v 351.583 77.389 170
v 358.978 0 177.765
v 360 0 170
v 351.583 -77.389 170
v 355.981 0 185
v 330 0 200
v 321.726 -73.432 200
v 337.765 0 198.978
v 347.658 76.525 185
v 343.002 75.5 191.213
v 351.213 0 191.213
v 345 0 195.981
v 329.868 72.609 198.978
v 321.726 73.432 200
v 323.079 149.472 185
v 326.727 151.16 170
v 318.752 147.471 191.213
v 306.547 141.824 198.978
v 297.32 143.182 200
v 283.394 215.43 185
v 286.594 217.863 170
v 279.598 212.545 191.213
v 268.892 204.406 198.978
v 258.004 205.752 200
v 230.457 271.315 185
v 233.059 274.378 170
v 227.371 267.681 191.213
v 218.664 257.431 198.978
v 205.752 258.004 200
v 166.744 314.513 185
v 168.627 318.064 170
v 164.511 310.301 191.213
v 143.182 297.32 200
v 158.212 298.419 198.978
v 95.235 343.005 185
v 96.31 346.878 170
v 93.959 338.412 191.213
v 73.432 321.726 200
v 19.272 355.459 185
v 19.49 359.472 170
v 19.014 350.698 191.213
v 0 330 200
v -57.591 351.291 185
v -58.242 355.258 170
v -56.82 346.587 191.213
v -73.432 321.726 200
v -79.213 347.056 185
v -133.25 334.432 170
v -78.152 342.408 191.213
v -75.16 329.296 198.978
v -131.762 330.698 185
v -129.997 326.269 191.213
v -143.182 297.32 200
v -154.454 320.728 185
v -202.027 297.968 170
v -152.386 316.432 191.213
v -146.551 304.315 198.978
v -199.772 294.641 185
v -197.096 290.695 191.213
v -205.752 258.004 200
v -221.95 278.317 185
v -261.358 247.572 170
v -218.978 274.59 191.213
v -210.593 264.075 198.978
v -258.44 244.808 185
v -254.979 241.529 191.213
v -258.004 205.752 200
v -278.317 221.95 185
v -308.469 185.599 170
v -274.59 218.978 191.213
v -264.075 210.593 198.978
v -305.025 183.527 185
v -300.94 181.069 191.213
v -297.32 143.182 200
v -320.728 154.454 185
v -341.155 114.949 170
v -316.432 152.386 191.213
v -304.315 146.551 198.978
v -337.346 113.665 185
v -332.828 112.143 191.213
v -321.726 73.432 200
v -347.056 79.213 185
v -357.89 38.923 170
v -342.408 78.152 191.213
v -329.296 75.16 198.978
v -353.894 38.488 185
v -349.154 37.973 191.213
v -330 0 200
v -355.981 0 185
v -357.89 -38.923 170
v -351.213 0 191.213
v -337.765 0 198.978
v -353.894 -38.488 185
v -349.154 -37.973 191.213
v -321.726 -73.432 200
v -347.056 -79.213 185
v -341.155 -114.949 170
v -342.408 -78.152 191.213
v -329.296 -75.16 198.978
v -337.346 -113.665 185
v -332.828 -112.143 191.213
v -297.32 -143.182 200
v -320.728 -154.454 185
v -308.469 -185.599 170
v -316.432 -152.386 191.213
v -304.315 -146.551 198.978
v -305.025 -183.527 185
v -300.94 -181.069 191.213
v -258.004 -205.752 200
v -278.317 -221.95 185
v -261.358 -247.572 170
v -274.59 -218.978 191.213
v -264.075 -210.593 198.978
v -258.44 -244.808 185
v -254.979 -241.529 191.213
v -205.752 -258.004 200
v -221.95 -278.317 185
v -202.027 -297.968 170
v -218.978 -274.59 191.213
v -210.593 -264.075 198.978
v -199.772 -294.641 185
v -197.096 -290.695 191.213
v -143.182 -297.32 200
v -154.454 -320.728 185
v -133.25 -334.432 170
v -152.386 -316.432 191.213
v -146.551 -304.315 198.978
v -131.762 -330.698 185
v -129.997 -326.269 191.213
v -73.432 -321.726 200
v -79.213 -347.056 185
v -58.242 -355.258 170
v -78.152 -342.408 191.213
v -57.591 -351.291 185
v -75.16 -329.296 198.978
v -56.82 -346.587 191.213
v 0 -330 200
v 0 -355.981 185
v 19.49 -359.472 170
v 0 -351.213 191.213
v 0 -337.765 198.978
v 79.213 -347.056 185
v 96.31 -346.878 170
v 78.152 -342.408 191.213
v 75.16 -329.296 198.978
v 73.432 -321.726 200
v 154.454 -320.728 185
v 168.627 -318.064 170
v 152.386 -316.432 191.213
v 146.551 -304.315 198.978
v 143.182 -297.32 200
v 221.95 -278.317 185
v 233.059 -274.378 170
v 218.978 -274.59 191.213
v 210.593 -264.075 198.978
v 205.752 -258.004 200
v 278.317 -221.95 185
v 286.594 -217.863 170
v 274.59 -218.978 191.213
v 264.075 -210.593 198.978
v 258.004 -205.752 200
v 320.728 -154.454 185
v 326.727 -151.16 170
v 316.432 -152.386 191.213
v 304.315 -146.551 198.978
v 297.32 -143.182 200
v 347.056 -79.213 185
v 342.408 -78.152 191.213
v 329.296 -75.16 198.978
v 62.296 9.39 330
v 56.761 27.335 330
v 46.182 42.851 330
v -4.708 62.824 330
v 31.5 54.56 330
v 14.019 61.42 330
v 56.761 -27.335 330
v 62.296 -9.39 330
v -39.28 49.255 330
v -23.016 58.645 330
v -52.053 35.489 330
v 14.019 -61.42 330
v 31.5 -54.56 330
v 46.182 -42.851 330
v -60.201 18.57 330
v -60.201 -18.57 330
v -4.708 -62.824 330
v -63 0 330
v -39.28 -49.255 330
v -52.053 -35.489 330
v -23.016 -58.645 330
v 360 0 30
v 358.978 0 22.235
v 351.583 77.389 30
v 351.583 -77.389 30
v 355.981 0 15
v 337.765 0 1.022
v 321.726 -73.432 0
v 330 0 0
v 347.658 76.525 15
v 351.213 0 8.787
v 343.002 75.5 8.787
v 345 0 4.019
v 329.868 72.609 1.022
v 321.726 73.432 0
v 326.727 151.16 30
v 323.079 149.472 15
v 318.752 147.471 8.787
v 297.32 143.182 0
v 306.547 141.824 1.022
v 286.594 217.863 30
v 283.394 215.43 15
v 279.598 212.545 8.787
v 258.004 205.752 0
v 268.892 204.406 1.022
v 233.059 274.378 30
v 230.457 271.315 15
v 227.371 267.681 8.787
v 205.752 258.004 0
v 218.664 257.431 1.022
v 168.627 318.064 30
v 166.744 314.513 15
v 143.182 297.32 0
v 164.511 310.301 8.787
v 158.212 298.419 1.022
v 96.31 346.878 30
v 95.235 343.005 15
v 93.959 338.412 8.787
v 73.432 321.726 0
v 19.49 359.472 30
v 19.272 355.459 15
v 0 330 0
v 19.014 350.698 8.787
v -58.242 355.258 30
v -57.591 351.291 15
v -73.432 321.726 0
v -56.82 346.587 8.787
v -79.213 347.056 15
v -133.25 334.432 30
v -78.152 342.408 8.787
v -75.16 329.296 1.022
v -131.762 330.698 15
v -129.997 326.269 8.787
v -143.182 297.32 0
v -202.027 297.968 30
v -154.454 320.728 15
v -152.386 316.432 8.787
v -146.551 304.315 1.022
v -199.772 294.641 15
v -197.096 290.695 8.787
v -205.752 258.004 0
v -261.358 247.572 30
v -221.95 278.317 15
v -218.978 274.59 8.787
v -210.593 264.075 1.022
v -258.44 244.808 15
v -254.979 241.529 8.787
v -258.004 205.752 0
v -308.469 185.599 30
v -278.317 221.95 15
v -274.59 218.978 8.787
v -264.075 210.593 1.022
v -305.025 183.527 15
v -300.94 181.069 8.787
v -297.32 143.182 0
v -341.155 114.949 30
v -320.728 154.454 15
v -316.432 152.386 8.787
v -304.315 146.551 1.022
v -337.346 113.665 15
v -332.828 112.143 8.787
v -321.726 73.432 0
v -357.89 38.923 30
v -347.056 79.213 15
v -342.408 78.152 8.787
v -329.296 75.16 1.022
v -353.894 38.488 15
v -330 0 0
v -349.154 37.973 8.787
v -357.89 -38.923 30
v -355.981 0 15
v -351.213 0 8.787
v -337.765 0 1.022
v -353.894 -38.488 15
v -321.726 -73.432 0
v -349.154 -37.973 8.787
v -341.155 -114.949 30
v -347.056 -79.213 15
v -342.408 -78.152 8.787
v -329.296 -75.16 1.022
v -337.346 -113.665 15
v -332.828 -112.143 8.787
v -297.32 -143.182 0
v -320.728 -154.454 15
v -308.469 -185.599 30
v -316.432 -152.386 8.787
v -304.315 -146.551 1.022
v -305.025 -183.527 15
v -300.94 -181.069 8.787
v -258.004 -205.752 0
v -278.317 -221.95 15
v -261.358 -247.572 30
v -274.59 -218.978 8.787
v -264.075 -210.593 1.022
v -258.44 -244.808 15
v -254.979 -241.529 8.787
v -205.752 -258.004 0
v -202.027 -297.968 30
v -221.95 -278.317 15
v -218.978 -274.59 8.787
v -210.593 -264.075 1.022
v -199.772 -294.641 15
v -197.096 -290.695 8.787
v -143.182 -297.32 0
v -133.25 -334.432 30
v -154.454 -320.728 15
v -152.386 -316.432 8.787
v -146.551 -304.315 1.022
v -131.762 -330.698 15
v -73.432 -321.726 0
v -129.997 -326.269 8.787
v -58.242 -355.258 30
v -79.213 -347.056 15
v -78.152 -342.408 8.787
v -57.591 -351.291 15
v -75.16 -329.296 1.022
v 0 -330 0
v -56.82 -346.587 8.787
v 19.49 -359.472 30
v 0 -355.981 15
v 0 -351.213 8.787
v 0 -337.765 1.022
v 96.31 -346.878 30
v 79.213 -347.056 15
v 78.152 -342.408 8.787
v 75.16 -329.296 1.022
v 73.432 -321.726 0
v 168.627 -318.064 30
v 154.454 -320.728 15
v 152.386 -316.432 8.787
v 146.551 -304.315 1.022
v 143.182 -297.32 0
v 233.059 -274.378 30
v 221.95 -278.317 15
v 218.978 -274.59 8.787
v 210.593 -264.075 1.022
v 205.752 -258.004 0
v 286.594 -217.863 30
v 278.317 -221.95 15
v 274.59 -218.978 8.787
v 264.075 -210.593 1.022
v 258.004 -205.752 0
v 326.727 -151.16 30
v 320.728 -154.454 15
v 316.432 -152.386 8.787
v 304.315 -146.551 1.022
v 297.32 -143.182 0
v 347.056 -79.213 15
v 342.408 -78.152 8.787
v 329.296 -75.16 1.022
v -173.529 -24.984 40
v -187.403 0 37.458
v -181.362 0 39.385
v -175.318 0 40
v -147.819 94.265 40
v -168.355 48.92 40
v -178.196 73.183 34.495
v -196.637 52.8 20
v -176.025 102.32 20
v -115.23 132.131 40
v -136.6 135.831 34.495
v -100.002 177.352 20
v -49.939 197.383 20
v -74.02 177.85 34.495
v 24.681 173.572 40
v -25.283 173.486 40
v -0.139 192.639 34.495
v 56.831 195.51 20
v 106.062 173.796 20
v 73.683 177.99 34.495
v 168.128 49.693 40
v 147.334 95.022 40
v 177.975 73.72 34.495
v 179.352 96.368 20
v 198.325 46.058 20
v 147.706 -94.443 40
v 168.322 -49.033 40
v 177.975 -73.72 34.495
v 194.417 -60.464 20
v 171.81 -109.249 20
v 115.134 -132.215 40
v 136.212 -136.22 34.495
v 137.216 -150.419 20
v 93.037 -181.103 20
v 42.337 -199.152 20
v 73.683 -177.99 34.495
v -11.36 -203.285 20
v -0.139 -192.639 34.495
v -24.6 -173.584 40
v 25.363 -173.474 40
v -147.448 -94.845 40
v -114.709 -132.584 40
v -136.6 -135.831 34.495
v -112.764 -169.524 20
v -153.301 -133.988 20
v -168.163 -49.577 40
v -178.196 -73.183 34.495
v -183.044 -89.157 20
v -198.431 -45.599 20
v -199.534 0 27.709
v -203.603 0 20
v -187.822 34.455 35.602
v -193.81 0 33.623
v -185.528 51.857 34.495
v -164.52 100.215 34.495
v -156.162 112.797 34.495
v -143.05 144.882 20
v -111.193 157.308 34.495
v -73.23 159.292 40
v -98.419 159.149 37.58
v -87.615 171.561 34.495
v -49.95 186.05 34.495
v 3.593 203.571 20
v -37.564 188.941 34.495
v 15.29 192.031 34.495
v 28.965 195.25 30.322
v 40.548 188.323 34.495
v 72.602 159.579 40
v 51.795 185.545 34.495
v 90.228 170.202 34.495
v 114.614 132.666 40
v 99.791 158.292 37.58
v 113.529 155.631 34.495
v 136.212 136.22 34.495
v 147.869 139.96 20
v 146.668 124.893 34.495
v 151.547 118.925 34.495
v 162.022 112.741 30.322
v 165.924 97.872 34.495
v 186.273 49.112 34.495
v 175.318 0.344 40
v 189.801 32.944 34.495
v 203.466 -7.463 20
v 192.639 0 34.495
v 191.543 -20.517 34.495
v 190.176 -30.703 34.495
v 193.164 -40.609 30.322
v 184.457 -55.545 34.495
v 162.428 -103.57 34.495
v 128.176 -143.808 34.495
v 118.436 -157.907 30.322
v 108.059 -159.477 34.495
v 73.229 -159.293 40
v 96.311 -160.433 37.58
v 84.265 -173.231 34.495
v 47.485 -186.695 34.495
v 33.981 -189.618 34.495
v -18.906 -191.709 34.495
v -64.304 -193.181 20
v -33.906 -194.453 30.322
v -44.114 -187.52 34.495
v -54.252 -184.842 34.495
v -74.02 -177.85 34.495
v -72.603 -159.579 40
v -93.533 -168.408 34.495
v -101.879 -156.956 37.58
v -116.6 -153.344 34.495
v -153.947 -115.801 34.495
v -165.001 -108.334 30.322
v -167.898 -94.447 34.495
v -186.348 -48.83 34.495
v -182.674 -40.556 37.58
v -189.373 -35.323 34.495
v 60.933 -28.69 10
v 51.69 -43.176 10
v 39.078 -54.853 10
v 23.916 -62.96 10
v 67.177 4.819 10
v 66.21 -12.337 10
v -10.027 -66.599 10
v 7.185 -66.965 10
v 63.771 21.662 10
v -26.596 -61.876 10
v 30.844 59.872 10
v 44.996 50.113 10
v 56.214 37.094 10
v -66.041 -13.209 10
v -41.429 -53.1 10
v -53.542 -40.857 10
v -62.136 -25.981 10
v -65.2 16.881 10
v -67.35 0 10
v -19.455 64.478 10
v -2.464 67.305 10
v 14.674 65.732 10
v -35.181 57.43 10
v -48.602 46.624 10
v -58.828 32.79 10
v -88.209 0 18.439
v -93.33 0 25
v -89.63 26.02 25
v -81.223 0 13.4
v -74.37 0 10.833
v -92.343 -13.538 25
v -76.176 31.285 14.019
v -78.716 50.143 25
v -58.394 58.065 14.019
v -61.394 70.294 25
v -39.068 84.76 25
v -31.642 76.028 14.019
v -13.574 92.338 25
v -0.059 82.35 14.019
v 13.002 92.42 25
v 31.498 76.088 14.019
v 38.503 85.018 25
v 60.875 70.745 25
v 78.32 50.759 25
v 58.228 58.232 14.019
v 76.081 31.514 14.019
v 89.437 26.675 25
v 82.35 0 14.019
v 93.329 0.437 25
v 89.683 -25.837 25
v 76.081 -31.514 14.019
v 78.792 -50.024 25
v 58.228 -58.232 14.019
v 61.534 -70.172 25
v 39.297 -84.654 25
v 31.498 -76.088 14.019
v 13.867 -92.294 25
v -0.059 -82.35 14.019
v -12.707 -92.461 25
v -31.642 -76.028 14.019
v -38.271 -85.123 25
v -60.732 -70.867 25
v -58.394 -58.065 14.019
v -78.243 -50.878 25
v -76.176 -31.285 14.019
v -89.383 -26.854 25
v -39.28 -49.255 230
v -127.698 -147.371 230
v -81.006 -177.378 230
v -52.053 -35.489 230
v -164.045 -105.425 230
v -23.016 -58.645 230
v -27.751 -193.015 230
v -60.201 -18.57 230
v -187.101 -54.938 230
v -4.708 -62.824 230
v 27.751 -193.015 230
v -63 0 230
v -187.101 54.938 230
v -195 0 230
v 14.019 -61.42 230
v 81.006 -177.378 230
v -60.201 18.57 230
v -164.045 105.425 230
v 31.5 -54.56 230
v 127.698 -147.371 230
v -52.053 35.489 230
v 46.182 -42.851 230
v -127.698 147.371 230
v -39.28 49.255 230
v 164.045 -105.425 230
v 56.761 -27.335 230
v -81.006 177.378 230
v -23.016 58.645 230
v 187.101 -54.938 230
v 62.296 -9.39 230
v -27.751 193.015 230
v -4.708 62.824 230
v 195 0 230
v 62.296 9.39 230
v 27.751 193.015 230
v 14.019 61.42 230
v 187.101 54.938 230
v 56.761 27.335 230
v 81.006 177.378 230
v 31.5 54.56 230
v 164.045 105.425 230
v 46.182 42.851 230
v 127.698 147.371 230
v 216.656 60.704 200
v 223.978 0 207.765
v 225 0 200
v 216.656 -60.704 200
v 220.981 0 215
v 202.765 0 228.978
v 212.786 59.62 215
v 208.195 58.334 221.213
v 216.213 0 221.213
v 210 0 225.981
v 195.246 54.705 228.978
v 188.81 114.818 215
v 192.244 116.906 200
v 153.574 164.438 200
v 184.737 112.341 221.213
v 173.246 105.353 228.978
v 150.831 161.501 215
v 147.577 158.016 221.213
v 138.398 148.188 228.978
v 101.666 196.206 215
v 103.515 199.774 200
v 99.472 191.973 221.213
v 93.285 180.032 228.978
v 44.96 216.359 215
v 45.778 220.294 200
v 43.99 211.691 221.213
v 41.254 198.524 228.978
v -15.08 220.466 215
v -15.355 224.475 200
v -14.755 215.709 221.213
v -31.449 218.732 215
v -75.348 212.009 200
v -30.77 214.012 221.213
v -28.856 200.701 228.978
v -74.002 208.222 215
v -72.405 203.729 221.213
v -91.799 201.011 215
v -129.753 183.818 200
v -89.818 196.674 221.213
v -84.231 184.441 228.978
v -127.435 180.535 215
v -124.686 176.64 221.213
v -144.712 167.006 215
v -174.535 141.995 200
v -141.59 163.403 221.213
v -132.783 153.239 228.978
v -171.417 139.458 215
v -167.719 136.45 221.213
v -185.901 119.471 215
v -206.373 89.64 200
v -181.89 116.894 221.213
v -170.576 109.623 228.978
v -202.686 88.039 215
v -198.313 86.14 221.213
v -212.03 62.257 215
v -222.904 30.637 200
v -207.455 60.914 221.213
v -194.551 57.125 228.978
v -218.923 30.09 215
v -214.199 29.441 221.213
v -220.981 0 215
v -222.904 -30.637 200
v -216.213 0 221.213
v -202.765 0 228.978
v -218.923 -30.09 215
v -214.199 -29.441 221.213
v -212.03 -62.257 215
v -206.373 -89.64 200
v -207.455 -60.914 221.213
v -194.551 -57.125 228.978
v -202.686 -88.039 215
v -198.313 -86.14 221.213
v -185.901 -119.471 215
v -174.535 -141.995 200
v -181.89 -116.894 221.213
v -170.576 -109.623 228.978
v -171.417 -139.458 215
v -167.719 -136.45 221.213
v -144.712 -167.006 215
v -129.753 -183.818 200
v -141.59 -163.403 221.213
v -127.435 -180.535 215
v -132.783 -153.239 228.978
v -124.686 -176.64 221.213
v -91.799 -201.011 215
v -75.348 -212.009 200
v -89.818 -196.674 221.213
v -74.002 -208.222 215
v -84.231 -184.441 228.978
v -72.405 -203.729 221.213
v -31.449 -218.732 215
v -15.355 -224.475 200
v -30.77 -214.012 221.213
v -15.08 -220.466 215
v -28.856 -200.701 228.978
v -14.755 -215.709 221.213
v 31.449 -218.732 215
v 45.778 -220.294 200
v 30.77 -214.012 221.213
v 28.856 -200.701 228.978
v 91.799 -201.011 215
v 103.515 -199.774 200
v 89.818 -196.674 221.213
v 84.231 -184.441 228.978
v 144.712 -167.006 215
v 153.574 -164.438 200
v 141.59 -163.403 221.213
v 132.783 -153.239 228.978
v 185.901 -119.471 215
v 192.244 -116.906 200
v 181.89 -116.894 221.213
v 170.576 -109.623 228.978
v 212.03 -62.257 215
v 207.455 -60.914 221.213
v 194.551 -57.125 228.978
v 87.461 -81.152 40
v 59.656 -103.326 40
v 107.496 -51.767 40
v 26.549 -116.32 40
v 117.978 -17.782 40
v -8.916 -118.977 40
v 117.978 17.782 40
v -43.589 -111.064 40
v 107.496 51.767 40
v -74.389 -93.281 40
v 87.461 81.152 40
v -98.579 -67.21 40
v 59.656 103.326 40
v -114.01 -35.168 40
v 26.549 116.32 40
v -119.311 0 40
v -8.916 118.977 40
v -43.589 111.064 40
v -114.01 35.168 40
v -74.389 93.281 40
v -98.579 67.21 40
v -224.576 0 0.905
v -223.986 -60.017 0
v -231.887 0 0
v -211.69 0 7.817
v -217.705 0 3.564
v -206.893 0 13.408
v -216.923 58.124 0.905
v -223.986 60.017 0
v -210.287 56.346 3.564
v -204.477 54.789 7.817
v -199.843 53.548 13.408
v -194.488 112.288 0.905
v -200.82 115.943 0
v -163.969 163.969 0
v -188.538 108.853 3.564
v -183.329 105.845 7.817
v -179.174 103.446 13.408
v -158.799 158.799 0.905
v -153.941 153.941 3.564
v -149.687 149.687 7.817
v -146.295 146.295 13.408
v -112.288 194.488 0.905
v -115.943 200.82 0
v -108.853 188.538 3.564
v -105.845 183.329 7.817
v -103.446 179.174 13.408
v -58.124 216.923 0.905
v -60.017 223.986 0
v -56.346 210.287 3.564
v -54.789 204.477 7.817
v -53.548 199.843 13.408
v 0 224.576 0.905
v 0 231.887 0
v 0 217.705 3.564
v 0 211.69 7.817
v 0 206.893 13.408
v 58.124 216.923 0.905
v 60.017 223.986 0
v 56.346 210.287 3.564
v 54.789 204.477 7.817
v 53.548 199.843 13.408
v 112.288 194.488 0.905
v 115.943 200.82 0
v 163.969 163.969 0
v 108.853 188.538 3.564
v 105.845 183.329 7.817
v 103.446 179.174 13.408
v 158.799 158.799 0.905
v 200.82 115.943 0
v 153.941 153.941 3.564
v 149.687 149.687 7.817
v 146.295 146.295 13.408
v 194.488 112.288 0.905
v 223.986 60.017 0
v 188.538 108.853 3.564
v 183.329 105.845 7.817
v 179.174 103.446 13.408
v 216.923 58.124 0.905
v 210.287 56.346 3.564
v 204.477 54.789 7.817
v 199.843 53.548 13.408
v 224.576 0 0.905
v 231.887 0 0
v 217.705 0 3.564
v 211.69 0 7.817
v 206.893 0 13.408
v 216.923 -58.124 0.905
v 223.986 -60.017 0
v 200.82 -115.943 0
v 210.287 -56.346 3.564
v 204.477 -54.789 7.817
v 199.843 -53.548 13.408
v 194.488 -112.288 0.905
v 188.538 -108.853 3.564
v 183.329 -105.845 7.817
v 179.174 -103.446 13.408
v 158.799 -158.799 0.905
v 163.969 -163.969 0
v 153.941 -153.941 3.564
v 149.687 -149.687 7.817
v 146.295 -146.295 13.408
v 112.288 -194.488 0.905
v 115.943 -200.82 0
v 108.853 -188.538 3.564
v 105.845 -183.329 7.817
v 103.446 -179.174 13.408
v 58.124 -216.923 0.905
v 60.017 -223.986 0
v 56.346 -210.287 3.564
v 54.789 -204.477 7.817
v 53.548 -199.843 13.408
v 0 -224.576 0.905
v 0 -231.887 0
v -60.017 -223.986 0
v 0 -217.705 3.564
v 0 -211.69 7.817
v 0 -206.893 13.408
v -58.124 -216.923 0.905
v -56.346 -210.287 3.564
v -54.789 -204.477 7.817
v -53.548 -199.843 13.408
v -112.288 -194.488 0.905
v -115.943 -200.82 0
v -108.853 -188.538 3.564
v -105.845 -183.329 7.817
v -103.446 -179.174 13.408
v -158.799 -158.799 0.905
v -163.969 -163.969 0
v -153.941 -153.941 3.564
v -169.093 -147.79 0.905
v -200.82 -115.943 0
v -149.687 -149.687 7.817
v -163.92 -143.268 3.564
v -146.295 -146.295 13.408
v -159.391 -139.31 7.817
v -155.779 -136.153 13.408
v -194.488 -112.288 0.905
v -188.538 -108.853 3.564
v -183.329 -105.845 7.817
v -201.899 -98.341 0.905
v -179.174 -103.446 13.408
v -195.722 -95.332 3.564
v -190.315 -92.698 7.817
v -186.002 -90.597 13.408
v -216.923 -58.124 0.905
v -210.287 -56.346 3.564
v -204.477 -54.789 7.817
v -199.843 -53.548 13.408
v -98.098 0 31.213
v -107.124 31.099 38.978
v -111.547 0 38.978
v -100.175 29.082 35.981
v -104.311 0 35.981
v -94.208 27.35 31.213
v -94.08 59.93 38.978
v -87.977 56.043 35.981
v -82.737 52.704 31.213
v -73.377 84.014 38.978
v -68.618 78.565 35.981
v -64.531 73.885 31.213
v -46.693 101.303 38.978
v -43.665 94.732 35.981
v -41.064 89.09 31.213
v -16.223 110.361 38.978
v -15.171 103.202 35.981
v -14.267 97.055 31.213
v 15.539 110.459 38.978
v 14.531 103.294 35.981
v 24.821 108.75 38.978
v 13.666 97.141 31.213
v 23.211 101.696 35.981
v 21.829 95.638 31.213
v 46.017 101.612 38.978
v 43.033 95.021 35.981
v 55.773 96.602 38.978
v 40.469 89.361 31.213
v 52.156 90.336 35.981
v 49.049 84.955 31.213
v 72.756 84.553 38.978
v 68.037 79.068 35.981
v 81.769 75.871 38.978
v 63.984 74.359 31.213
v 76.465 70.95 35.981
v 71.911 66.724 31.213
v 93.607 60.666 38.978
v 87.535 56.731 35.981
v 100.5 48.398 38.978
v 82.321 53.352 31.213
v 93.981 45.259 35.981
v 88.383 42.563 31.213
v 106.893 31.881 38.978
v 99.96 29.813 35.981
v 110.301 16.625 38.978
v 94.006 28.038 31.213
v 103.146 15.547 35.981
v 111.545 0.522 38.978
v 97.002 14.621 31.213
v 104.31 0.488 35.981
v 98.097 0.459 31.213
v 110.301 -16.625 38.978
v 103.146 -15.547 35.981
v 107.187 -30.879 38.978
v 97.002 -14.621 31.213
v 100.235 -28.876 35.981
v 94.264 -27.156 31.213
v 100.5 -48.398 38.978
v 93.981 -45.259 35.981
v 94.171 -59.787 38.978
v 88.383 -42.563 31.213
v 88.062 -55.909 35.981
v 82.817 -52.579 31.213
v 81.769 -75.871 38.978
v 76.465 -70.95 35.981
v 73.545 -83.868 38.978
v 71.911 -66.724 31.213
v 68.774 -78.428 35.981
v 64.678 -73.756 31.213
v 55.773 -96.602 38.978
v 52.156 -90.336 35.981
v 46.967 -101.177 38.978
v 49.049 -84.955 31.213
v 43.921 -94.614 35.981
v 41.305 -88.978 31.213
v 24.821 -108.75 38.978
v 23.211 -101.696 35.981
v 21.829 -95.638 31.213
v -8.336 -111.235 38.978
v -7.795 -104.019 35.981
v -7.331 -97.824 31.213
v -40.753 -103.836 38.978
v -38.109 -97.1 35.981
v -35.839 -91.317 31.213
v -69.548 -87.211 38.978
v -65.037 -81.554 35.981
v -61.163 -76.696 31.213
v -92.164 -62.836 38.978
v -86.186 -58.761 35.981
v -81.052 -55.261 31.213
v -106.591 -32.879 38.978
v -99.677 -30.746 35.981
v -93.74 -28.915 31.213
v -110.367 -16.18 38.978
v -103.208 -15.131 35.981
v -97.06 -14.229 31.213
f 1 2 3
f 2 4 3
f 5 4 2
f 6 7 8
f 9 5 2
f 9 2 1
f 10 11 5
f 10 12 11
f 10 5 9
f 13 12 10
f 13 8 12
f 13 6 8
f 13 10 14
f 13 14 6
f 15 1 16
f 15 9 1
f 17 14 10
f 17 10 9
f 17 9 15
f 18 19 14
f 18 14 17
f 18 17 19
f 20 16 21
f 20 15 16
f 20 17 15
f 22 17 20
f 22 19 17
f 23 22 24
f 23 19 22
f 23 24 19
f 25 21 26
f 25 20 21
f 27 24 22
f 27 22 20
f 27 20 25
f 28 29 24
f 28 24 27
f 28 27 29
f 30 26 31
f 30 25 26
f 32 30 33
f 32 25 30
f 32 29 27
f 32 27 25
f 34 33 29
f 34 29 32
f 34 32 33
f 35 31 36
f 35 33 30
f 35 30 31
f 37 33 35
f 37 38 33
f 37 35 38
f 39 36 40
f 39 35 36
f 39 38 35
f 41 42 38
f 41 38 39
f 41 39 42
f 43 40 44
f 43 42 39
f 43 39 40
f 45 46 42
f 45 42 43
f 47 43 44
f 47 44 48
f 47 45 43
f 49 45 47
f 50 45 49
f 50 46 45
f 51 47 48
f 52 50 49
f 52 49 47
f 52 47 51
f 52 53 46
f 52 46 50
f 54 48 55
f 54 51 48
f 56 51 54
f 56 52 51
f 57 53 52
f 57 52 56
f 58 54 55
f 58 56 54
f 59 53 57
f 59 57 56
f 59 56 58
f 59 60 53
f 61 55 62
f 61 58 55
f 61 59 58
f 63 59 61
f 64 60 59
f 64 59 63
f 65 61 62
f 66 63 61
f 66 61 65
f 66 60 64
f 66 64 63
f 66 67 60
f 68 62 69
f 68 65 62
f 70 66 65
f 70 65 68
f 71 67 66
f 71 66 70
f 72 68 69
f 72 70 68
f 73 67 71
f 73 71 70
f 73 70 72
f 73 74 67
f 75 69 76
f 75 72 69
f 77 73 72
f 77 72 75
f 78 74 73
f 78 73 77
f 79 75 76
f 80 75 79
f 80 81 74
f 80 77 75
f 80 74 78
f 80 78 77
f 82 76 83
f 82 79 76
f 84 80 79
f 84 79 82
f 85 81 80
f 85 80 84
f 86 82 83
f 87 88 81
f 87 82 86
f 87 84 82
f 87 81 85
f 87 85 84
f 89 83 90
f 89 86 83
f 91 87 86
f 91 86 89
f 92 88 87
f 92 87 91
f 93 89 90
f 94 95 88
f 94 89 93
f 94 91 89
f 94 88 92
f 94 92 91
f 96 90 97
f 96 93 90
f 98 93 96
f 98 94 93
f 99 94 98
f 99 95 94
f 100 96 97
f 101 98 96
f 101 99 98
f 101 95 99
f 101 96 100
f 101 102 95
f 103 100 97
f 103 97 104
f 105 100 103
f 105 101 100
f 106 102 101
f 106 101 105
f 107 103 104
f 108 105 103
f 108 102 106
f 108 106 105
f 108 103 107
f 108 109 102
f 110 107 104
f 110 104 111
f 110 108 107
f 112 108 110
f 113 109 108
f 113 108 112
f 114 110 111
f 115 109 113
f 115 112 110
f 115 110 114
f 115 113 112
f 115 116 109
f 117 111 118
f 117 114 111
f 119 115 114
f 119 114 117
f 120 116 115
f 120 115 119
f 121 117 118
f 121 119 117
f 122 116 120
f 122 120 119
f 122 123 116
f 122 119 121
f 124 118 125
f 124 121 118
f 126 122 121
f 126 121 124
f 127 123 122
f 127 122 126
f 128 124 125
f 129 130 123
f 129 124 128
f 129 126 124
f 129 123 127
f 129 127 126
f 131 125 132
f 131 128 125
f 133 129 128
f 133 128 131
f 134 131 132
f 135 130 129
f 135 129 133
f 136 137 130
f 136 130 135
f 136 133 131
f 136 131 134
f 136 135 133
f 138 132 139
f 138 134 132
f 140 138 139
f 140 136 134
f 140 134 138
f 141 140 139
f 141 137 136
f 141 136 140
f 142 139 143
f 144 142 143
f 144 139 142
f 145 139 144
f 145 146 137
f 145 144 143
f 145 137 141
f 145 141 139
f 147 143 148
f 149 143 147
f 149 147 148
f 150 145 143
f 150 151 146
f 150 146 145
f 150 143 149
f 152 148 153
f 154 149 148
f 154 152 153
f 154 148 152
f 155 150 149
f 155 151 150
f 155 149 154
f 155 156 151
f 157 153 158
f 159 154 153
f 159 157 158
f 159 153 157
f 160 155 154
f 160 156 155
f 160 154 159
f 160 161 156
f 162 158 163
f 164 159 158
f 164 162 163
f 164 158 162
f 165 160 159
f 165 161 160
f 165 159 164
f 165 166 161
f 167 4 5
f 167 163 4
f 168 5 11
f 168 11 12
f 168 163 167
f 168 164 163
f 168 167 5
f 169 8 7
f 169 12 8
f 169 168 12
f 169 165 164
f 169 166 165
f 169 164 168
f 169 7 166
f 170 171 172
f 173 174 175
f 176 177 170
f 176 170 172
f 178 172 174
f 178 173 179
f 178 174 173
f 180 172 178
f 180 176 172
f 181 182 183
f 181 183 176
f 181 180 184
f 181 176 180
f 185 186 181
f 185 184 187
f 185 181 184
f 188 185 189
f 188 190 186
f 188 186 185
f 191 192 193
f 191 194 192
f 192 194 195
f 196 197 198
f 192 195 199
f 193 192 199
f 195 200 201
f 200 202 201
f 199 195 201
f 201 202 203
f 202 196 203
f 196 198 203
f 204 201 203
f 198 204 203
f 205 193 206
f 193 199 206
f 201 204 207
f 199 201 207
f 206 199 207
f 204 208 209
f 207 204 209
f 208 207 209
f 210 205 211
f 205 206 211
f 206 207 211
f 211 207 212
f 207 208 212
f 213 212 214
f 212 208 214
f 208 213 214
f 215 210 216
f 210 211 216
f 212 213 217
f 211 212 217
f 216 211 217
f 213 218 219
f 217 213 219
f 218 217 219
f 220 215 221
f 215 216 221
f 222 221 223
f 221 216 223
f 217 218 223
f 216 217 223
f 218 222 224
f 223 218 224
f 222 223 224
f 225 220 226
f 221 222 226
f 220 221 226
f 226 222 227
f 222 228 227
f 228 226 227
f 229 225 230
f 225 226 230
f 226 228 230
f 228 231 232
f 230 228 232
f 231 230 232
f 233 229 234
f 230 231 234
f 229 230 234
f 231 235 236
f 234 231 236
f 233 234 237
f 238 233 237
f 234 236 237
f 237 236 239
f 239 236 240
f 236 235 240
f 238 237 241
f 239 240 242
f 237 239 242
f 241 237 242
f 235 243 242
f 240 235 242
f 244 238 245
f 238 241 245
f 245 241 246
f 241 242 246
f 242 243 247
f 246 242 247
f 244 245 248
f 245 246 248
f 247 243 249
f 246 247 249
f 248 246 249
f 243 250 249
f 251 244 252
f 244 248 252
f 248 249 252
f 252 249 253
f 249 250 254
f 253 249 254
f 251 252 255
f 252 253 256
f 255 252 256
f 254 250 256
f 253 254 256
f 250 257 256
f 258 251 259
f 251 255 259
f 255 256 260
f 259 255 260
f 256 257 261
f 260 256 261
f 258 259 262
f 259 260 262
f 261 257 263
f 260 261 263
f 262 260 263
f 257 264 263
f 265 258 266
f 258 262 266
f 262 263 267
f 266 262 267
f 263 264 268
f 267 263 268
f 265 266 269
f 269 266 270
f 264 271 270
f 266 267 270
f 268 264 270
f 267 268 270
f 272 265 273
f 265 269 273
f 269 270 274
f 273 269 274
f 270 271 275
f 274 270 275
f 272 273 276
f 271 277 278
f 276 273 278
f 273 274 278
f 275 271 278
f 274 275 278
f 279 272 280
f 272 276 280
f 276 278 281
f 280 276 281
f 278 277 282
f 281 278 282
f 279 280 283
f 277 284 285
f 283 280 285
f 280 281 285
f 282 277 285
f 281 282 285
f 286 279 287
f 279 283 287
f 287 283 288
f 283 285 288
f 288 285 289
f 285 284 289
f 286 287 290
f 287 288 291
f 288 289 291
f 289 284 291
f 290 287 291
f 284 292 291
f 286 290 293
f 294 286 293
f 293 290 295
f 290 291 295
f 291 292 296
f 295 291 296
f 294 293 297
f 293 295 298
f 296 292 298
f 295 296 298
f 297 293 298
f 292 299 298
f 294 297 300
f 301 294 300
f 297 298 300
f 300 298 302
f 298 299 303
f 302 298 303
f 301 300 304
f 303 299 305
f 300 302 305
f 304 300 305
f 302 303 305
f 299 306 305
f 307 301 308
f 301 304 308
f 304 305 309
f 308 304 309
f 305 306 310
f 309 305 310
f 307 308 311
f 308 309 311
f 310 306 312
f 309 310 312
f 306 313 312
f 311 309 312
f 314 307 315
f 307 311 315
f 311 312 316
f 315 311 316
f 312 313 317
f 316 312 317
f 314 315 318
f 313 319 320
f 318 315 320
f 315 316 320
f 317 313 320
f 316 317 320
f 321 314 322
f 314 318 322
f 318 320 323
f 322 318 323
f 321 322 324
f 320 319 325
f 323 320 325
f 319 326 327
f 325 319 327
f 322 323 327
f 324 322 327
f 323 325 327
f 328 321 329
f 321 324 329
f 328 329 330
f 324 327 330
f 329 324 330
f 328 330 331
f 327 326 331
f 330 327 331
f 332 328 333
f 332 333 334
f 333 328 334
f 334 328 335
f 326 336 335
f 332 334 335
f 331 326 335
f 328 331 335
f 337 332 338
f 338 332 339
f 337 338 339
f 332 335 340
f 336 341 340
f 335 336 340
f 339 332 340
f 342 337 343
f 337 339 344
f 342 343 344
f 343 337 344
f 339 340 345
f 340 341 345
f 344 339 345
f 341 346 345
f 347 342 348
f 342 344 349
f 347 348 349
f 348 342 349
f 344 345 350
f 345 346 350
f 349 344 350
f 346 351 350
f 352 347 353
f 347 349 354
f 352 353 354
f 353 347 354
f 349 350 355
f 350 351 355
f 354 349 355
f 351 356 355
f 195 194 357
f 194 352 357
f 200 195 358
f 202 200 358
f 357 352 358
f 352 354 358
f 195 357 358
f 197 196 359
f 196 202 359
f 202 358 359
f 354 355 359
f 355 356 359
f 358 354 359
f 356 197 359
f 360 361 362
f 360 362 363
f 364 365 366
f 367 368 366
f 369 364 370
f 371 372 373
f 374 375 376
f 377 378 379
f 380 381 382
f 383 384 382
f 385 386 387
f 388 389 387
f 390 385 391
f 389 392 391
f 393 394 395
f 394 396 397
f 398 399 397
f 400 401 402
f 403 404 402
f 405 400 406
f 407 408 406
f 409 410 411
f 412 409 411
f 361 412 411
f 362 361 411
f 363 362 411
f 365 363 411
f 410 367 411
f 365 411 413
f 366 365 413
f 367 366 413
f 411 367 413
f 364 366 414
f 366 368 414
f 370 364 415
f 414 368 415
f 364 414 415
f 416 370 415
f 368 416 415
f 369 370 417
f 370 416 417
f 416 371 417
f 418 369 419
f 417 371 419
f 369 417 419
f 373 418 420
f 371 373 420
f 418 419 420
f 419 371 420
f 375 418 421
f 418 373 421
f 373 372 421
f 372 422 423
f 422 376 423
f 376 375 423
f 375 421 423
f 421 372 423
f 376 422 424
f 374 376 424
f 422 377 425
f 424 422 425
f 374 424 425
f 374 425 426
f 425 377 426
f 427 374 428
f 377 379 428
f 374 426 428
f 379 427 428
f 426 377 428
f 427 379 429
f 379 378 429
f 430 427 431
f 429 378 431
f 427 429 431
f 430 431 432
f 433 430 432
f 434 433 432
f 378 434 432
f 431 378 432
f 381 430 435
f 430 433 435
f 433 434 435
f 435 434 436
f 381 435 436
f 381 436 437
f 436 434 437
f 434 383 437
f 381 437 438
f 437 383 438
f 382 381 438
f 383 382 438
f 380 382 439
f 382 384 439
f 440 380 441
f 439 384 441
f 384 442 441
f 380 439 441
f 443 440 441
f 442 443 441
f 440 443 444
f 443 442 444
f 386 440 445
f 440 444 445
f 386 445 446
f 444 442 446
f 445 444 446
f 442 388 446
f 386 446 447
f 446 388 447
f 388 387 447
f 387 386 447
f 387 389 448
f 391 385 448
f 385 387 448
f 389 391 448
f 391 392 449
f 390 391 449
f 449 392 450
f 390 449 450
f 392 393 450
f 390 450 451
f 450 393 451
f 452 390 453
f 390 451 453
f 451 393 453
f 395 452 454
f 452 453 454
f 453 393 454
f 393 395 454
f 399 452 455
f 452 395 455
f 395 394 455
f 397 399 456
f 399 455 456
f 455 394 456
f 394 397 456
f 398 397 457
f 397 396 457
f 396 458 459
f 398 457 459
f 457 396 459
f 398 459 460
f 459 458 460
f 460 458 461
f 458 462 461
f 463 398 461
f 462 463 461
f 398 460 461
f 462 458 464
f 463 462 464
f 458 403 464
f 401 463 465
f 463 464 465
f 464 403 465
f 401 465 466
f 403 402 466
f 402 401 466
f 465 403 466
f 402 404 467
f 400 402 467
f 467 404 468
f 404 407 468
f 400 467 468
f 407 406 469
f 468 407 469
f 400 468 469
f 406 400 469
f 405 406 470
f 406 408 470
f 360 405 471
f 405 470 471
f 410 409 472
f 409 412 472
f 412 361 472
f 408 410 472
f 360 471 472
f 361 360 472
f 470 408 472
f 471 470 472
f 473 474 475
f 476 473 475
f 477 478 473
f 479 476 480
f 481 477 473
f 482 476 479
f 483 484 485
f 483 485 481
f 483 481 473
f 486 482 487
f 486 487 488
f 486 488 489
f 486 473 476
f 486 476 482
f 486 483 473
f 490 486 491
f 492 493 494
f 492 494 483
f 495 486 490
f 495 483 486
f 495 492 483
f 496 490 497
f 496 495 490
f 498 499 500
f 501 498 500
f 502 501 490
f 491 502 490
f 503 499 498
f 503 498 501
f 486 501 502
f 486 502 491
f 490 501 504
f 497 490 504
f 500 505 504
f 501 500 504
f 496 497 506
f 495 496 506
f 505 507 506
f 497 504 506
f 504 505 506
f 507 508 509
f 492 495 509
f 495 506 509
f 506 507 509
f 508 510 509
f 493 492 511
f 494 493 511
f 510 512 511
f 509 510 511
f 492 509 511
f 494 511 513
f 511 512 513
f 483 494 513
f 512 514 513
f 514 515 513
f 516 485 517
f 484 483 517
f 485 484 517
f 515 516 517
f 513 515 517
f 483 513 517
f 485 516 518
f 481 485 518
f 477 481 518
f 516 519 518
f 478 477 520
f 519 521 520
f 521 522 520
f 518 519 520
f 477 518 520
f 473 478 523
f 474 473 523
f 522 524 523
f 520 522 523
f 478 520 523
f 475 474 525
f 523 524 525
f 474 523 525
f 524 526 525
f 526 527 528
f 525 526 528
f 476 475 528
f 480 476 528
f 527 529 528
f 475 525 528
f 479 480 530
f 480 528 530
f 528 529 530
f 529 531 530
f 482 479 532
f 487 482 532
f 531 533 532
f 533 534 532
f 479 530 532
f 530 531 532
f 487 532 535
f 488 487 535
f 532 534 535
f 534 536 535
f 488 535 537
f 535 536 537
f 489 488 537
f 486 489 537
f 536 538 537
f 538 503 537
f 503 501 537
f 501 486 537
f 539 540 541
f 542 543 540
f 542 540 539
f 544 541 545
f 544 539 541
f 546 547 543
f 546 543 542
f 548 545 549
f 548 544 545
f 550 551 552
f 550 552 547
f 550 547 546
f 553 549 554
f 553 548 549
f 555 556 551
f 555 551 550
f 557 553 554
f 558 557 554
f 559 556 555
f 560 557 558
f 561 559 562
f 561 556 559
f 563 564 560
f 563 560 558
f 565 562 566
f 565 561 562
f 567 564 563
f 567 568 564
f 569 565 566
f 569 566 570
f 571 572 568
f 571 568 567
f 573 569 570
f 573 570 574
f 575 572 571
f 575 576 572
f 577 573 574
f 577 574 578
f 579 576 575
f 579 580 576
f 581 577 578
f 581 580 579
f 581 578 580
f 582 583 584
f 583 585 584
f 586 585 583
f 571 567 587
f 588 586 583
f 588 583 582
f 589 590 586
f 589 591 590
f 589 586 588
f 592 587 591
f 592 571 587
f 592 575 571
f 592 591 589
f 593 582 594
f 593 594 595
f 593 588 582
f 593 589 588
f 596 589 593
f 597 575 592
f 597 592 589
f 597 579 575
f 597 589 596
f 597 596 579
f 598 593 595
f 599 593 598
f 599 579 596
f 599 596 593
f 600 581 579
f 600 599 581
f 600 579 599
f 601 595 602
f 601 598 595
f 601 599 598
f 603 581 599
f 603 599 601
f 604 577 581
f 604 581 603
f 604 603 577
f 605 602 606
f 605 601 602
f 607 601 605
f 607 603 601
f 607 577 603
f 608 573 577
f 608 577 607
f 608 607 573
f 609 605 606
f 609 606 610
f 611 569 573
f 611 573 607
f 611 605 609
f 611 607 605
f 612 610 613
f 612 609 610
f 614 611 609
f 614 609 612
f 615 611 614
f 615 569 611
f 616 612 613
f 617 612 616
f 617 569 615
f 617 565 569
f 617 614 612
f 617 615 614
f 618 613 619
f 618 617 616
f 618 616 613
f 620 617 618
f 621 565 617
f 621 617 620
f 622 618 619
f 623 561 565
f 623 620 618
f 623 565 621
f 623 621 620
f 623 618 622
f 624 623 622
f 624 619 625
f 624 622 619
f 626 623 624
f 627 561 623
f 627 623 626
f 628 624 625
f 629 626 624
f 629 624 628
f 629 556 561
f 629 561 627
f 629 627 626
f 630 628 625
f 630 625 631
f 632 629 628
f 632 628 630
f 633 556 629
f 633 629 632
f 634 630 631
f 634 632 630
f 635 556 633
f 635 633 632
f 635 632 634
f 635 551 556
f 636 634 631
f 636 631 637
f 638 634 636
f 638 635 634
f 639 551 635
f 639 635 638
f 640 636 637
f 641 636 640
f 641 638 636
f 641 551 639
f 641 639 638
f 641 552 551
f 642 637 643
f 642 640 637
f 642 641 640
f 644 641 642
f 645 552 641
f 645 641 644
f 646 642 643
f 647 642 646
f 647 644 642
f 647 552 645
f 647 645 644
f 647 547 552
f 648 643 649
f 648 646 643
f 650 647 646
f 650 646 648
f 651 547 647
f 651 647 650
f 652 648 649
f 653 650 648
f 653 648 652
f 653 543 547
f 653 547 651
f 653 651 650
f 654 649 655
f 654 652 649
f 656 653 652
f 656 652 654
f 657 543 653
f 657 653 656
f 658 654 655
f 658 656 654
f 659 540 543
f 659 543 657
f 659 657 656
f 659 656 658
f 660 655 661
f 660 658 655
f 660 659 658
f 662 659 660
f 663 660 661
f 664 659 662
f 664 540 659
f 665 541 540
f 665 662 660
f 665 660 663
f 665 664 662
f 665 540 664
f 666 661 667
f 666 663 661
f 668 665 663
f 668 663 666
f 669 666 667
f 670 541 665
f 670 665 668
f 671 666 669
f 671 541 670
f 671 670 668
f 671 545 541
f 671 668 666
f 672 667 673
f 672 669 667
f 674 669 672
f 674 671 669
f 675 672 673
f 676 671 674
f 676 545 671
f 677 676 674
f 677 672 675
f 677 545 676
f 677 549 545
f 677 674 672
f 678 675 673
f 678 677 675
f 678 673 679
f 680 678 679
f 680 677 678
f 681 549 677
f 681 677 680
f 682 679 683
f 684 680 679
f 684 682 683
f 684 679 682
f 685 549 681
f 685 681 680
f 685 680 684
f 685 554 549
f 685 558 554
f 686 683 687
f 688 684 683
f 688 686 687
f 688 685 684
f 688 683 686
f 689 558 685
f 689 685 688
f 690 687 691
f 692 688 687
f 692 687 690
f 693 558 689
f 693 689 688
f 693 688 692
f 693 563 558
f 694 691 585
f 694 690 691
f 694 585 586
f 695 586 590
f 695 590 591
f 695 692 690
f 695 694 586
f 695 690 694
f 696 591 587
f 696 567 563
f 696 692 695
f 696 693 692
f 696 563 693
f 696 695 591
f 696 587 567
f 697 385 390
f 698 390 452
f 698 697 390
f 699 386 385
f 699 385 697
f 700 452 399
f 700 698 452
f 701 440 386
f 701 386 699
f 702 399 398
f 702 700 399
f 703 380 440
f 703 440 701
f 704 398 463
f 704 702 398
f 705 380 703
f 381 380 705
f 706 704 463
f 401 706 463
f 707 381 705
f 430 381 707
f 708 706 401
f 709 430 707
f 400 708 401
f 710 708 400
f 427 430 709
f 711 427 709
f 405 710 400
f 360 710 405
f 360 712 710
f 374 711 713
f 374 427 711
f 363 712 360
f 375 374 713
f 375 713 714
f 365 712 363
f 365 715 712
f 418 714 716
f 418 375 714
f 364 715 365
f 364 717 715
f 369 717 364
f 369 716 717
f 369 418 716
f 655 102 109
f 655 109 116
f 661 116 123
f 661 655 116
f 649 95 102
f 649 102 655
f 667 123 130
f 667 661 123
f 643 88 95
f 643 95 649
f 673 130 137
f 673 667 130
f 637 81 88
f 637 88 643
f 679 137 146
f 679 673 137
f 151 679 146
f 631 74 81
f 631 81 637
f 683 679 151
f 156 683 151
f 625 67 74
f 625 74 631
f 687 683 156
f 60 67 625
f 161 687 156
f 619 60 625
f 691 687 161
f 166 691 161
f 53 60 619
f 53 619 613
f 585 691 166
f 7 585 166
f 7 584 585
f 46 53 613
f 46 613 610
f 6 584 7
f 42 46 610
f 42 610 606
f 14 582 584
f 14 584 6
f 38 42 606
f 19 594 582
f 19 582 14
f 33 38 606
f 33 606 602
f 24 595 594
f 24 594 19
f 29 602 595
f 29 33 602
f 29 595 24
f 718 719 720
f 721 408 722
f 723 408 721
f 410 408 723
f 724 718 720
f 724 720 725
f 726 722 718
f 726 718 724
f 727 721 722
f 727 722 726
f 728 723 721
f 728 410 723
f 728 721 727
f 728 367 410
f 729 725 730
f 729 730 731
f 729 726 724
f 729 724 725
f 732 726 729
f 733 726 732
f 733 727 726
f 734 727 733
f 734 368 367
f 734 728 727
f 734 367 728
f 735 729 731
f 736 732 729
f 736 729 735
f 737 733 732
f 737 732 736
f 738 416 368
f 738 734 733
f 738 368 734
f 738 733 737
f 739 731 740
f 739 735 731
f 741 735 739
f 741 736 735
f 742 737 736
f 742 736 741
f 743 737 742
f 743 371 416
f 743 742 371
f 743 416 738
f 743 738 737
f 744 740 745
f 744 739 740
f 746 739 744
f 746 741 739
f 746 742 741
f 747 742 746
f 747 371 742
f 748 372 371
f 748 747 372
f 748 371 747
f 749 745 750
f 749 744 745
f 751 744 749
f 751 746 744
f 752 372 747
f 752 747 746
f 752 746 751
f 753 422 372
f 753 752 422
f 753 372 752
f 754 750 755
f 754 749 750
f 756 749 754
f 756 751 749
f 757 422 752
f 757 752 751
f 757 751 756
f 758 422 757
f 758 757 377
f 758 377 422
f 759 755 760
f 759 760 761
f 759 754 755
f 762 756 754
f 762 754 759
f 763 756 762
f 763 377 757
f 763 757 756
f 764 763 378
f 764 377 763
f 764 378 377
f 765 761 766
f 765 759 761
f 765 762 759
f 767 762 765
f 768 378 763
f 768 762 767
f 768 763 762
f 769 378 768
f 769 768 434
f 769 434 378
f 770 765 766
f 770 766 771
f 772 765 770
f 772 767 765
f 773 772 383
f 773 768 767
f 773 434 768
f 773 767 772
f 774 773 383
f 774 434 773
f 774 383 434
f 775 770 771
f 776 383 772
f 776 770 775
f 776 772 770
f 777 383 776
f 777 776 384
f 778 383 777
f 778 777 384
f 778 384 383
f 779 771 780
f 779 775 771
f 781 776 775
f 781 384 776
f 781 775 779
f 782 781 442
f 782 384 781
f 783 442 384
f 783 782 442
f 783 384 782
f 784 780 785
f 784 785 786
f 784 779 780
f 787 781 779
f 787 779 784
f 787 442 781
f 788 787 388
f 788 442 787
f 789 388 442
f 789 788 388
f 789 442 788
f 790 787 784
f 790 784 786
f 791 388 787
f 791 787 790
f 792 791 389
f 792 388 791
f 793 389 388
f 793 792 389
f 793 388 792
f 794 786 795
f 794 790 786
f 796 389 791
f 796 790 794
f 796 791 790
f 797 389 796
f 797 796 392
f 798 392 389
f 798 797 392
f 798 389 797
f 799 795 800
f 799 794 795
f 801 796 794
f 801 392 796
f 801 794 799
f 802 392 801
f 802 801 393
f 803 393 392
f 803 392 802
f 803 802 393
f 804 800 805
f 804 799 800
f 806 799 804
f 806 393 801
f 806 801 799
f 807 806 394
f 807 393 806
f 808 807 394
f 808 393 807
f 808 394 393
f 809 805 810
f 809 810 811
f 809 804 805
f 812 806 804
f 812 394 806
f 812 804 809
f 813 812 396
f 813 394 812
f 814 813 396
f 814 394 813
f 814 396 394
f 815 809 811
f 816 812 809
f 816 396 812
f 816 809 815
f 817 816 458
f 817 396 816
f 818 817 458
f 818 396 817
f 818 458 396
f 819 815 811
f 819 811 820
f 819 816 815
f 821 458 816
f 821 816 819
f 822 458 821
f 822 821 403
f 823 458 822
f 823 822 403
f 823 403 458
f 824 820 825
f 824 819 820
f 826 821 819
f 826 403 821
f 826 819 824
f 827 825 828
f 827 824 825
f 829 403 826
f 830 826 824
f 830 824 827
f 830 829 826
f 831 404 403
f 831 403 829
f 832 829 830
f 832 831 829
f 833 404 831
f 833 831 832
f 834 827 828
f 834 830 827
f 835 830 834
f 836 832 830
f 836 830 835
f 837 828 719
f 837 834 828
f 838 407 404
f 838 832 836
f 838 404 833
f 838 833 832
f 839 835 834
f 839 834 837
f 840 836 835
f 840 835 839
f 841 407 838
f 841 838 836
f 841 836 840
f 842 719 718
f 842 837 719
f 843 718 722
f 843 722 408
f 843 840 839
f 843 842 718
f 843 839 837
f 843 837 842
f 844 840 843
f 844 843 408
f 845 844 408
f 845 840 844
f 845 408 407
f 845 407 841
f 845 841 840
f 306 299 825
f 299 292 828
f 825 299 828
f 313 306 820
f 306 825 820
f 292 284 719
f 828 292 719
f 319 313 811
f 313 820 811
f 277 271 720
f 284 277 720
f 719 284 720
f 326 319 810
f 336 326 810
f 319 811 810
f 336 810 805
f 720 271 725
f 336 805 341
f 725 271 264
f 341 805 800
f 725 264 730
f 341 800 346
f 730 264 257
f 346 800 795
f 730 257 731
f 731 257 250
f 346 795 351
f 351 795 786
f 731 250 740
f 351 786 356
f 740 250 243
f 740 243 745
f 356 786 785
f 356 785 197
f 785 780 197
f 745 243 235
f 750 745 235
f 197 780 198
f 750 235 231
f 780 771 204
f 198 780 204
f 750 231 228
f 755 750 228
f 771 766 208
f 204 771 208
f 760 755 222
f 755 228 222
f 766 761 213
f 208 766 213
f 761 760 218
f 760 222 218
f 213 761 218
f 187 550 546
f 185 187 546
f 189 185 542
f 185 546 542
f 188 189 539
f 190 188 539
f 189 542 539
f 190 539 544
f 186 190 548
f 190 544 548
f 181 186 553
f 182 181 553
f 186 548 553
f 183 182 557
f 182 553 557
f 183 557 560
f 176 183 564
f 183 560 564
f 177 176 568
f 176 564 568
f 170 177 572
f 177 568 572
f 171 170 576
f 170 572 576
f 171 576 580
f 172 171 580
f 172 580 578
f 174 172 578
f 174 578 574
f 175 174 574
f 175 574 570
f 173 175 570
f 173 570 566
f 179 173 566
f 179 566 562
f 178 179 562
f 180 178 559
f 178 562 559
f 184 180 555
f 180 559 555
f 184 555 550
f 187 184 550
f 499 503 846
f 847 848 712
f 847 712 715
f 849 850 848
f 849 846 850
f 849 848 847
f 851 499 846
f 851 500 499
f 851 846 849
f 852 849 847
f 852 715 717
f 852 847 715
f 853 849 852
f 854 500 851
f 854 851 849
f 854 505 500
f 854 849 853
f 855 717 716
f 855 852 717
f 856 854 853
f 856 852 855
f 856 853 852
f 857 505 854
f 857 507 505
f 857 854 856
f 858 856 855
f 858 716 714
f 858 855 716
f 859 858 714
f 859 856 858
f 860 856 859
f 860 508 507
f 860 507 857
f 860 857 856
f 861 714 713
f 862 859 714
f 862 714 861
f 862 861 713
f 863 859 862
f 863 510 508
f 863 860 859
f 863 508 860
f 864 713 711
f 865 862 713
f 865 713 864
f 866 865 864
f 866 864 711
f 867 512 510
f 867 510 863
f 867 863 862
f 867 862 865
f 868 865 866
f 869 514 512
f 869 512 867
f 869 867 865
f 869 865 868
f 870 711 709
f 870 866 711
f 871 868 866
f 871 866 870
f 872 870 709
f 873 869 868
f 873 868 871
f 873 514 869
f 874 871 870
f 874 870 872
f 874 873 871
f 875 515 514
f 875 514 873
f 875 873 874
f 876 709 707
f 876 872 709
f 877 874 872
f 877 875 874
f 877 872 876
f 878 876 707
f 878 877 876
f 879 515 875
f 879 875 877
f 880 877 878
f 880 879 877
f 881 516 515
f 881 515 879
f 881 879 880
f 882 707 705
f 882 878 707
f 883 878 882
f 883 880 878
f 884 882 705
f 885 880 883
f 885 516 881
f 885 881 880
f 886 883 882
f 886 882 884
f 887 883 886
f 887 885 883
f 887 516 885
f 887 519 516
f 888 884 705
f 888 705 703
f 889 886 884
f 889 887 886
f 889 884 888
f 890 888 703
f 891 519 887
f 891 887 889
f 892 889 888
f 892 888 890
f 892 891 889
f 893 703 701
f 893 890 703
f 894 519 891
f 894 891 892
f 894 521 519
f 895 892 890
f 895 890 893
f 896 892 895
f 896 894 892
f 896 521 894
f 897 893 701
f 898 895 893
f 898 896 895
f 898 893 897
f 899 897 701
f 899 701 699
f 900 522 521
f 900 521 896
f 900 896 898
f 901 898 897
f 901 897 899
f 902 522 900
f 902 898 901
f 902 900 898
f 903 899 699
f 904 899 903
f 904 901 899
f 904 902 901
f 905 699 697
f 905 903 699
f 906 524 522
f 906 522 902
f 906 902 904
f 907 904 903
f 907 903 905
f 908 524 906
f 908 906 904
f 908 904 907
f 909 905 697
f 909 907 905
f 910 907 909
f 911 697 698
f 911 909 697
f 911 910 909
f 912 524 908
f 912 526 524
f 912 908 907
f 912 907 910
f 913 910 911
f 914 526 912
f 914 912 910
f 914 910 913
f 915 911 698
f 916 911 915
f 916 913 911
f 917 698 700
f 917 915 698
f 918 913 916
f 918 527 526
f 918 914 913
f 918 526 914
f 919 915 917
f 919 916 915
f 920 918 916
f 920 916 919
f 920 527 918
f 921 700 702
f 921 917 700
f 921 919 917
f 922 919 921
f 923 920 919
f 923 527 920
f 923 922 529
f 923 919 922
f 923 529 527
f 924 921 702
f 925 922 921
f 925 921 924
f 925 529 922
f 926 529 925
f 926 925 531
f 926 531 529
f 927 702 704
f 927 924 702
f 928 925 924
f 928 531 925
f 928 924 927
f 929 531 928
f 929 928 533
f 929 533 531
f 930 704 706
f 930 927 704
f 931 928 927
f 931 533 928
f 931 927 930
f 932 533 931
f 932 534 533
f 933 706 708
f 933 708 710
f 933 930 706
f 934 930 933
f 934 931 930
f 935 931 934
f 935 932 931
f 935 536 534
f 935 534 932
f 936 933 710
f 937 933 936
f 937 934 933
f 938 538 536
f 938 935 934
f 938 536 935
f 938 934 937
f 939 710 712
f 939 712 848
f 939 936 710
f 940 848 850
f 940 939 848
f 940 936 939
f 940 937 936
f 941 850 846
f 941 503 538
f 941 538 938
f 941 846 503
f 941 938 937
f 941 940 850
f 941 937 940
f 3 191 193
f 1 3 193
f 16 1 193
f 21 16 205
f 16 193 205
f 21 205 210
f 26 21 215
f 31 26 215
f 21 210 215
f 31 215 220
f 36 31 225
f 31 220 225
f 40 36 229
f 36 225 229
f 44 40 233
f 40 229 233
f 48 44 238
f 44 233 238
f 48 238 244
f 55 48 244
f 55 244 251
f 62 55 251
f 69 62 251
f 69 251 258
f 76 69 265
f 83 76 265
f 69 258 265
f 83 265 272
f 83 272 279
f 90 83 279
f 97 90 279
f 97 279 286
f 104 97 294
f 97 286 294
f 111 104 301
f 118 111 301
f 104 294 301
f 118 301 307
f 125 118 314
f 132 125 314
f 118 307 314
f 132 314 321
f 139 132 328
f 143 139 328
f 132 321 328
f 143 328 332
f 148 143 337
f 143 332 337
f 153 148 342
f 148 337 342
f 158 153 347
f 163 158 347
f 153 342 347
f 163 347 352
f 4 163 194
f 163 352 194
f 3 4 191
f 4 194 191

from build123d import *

# Parameters (mm, degrees)
SKETCH1_R           = 360
BOSS_EXTRUDE1_DEPTH = 200
SKETCH2_R           = 225
BOSS_EXTRUDE2_DEPTH = 30
SKETCH3_R           = 63
BOSS_EXTRUDE3_DEPTH = 100
FILLET1_R           = 30
SKETCH4_R           = 201.886899345
CUT_EXTRUDE1_DEPTH  = 40
FILLET2_R           = 30
FILLET3_R           = 30
SKETCH5_R           = 89.311171206
BOSS_EXTRUDE4_DEPTH = 30
FILLET4_R           = 30
FILLET5_R           = 30


with BuildPart() as part:
    # Sketch1 → Boss-Extrude1 (new body)
    with BuildSketch(Plane.XY):
        Circle(SKETCH1_R)
    extrude(amount=BOSS_EXTRUDE1_DEPTH)

    # Sketch2 → Boss-Extrude2 (add)
    with BuildSketch(Plane.XY.offset(200)):
        Circle(SKETCH2_R)
    extrude(amount=BOSS_EXTRUDE2_DEPTH)

    # Sketch3 → Boss-Extrude3 (add)
    with BuildSketch(Plane.XY.offset(230)):
        with Locations(Location((0, 0, 0), (0, 0, 180))):
            Circle(SKETCH3_R)
    extrude(amount=BOSS_EXTRUDE3_DEPTH)

    # Fillet1
    fillet1_edges = [part.edges().sort_by_distance(p)[0] for p in [
        (-360, 0, 0),
        (-360, 0, 200),
        (-225, 0, 230),
    ]]
    fillet(fillet1_edges, radius=FILLET1_R - 0.0001)  # a hair under: the kernel refuses the full size

    # Sketch4 → Cut-Extrude1 (cut)
    with BuildSketch(Plane(origin=(0, 0, 0), x_dir=(-1, 0, 0), z_dir=(0, 0, -1))):
        Circle(SKETCH4_R)
    extrude(amount=-CUT_EXTRUDE1_DEPTH, mode=Mode.SUBTRACT)

    # Fillet2
    fillet2_edges = [part.edges().sort_by_distance(p)[0] for p in [
        (201.886899345, 0, 0),
    ]]
    fillet(fillet2_edges, radius=FILLET2_R)

    # Fillet3
    fillet3_edges = [part.edges().sort_by_distance(p)[0] for p in [
        (201.886899345, 0, 40),
    ]]
    fillet(fillet3_edges, radius=FILLET3_R)

    # Sketch5 → Boss-Extrude4 (add)
    with BuildSketch(Plane(origin=(0, 0, 40), x_dir=(-1, 0, 0), z_dir=(0, 0, -1))):
        Circle(SKETCH5_R)
    extrude(amount=BOSS_EXTRUDE4_DEPTH)

    # Fillet4
    fillet4_edges = [part.edges().sort_by_distance(p)[0] for p in [
        (89.311171206, 0, 40),
    ]]
    fillet(fillet4_edges, radius=FILLET4_R - 0.0001)  # a hair under: the kernel refuses the full size

    # Fillet5
    fillet5_edges = [part.edges().sort_by_distance(p)[0] for p in [
        (89.311171206, 0, 10),
    ]]
    fillet(fillet5_edges, radius=FILLET5_R)


solid = part.part
